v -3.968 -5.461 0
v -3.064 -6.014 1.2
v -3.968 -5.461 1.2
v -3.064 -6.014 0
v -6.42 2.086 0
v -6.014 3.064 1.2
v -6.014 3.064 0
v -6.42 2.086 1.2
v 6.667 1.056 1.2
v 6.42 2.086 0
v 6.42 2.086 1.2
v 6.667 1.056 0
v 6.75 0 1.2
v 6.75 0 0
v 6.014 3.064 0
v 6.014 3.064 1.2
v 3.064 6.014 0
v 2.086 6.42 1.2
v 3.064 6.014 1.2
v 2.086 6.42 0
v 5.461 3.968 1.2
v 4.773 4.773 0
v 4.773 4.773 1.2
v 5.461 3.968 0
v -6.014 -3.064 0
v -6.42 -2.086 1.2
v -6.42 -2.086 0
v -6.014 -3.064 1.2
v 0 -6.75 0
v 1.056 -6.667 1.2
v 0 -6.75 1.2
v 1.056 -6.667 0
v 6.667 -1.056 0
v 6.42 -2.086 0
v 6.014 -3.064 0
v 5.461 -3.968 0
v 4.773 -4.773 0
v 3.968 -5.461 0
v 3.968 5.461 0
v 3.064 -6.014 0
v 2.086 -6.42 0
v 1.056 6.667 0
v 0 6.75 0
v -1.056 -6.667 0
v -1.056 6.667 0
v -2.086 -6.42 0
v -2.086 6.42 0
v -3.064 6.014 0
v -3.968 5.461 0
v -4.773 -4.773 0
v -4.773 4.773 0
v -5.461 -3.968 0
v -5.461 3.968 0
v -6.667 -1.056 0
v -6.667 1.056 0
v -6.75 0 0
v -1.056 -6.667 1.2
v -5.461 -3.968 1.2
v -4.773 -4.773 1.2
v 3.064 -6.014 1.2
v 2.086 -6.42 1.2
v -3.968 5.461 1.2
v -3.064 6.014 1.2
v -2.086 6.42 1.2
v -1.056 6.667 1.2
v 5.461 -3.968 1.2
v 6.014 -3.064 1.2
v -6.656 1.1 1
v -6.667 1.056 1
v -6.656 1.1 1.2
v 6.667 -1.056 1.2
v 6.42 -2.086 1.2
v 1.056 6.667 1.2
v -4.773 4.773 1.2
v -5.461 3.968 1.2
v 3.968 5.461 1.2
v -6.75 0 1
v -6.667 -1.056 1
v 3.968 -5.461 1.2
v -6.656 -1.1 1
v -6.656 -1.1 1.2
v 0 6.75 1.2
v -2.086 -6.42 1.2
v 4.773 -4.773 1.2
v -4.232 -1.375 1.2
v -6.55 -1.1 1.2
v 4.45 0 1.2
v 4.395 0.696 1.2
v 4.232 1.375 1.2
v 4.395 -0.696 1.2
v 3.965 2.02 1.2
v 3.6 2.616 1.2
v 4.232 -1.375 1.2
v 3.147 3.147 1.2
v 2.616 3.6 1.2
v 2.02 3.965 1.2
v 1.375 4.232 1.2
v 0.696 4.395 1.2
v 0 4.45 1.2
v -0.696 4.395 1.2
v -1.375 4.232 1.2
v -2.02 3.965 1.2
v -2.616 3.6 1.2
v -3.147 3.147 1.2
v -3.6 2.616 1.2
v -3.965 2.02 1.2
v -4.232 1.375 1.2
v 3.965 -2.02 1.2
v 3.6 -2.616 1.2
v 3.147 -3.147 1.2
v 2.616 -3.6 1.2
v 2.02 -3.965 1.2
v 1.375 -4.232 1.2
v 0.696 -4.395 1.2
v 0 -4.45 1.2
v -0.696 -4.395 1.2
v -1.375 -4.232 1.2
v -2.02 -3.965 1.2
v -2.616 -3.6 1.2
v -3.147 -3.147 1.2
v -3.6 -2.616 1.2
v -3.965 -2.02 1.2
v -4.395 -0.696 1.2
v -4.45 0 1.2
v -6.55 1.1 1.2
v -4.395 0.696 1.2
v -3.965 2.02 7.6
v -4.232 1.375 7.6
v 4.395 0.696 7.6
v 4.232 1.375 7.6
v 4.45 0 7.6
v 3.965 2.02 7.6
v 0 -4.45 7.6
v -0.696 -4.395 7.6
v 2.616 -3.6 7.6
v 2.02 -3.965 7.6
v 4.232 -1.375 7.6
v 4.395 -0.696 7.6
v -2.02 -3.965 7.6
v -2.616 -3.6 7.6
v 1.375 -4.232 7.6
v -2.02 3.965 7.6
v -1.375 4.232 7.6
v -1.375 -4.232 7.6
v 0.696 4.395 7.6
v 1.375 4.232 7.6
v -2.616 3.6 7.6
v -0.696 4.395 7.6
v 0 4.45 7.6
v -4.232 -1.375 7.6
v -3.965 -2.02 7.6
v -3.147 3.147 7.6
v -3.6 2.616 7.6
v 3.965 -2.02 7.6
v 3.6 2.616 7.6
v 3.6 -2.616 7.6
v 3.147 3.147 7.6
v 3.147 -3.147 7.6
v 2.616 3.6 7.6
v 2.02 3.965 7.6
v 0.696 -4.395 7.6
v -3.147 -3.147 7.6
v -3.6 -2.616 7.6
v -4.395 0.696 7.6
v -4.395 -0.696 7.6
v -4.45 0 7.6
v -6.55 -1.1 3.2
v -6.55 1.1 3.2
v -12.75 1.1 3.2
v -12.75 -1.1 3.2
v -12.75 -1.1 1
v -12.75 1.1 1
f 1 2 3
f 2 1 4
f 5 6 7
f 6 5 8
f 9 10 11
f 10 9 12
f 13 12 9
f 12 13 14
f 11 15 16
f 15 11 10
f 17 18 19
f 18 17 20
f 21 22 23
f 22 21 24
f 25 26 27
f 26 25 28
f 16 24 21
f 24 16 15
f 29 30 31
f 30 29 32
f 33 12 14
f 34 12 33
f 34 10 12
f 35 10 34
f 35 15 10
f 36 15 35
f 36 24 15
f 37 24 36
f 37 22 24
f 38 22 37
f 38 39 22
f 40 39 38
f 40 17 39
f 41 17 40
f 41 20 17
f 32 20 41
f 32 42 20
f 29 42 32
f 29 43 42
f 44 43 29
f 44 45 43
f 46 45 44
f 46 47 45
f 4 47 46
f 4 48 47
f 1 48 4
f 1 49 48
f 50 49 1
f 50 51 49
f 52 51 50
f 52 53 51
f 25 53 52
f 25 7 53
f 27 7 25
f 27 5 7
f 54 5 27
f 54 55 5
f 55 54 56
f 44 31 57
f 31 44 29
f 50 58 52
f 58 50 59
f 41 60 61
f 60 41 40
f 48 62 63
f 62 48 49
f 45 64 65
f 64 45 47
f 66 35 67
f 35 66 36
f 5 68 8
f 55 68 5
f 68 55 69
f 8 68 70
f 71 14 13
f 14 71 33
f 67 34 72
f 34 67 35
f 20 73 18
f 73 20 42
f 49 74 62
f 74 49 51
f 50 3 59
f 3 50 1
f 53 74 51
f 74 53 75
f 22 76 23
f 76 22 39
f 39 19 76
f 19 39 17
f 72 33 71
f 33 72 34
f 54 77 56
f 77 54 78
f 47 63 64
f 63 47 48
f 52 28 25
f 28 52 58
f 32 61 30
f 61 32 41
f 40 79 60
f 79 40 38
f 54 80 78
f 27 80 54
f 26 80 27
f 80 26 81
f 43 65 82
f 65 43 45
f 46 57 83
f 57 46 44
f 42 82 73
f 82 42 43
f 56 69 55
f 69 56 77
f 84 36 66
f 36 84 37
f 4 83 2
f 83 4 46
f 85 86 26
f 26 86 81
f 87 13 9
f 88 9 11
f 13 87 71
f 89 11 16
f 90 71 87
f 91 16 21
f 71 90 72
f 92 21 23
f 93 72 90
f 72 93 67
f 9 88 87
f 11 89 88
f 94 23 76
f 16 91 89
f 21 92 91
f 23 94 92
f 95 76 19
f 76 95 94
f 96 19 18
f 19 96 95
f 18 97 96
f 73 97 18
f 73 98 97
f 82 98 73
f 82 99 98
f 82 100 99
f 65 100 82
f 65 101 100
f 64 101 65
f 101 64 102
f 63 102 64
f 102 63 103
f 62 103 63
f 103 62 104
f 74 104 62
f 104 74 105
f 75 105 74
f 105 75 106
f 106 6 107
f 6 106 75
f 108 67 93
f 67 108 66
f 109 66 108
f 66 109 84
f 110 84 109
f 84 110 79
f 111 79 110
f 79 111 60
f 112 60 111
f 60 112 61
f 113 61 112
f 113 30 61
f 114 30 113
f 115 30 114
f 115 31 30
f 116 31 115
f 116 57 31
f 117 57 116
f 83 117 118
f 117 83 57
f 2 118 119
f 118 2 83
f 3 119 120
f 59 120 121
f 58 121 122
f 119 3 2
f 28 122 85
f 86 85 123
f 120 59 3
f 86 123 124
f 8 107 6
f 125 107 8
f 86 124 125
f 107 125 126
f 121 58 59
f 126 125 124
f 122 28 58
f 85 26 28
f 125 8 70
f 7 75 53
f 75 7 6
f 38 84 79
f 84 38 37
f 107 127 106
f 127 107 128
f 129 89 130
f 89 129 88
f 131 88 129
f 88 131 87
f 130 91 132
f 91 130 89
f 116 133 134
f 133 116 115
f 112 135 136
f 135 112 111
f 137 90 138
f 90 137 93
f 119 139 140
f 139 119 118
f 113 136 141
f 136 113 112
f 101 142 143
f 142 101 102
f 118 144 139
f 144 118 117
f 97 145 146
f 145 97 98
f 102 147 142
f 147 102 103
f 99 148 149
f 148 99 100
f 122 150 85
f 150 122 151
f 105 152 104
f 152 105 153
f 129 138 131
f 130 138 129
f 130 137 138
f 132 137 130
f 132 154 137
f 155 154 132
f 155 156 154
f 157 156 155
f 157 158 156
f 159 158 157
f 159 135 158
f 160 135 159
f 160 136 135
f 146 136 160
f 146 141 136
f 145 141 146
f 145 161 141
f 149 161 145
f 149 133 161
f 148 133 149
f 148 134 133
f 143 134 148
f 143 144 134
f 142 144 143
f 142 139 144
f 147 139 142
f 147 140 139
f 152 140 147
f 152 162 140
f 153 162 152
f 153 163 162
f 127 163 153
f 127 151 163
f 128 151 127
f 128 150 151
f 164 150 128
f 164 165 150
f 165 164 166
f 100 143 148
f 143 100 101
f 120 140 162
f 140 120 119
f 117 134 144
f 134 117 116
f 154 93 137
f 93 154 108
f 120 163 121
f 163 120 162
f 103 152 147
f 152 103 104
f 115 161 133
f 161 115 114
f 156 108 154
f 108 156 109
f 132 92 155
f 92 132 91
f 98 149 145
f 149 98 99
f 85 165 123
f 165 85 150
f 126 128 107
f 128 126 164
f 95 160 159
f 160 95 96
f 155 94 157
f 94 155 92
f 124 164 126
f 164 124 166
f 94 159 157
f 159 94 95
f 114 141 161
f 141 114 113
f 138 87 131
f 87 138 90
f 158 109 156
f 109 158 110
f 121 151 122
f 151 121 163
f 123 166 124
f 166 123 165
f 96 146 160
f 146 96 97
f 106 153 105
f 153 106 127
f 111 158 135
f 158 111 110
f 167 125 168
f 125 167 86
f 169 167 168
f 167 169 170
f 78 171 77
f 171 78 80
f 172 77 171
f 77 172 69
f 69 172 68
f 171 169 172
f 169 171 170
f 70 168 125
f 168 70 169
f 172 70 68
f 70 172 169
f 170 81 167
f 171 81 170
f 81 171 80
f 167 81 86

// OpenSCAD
// Pi Flux - TPU plug for the sealed charge port
// r2/r3: round-nosed plug for the USB-C rectangular opening.
// r4: round plug for the Ø9.5 mm DC socket hole (the HAT (B) charges from 8.4 V DC).
// Print in TPU, flange on the bed. The flange seats in the outside O-ring recess
// (`CHG_REC_W` across); the body fills the opening.
include <common.scad>

module charge_plug() {
    fw = CHG_REC_W - 0.5;
    // flange (sits in the outside recess)
    if (R4) {
        translate([0, 0, 0]) cylinder(d=fw, h=1.2);
        // round body, 0.3 mm clearance all round, 6.6 mm deep into the socket bore
        translate([0, 0, 1.0]) cylinder(d=CHG_W - 0.6, h=6.6);
    } else {
        fh = CHG_REC_H - 0.5;
        translate([-fw/2, -fh/2, 0]) cube([fw, fh, 1.2]);
        // USB-C body, 0.3 mm clearance all round
        translate([-(CHG_W-0.6)/2, -(CHG_H-0.6)/2, 1.0])
            linear_extrude(6.6) rrect(CHG_W-0.6, CHG_H-0.6, 1.2);
        // pull tab
        translate([-fw/2-6, -fh/2, 1.0]) cube([6.2, fh, 2.2]);
    }
    // pull tab (both variants)
    if (R4) translate([-fw/2-6, -1.1, 1.0]) cube([6.2, 2.2, 2.2]);
}
charge_plug();
